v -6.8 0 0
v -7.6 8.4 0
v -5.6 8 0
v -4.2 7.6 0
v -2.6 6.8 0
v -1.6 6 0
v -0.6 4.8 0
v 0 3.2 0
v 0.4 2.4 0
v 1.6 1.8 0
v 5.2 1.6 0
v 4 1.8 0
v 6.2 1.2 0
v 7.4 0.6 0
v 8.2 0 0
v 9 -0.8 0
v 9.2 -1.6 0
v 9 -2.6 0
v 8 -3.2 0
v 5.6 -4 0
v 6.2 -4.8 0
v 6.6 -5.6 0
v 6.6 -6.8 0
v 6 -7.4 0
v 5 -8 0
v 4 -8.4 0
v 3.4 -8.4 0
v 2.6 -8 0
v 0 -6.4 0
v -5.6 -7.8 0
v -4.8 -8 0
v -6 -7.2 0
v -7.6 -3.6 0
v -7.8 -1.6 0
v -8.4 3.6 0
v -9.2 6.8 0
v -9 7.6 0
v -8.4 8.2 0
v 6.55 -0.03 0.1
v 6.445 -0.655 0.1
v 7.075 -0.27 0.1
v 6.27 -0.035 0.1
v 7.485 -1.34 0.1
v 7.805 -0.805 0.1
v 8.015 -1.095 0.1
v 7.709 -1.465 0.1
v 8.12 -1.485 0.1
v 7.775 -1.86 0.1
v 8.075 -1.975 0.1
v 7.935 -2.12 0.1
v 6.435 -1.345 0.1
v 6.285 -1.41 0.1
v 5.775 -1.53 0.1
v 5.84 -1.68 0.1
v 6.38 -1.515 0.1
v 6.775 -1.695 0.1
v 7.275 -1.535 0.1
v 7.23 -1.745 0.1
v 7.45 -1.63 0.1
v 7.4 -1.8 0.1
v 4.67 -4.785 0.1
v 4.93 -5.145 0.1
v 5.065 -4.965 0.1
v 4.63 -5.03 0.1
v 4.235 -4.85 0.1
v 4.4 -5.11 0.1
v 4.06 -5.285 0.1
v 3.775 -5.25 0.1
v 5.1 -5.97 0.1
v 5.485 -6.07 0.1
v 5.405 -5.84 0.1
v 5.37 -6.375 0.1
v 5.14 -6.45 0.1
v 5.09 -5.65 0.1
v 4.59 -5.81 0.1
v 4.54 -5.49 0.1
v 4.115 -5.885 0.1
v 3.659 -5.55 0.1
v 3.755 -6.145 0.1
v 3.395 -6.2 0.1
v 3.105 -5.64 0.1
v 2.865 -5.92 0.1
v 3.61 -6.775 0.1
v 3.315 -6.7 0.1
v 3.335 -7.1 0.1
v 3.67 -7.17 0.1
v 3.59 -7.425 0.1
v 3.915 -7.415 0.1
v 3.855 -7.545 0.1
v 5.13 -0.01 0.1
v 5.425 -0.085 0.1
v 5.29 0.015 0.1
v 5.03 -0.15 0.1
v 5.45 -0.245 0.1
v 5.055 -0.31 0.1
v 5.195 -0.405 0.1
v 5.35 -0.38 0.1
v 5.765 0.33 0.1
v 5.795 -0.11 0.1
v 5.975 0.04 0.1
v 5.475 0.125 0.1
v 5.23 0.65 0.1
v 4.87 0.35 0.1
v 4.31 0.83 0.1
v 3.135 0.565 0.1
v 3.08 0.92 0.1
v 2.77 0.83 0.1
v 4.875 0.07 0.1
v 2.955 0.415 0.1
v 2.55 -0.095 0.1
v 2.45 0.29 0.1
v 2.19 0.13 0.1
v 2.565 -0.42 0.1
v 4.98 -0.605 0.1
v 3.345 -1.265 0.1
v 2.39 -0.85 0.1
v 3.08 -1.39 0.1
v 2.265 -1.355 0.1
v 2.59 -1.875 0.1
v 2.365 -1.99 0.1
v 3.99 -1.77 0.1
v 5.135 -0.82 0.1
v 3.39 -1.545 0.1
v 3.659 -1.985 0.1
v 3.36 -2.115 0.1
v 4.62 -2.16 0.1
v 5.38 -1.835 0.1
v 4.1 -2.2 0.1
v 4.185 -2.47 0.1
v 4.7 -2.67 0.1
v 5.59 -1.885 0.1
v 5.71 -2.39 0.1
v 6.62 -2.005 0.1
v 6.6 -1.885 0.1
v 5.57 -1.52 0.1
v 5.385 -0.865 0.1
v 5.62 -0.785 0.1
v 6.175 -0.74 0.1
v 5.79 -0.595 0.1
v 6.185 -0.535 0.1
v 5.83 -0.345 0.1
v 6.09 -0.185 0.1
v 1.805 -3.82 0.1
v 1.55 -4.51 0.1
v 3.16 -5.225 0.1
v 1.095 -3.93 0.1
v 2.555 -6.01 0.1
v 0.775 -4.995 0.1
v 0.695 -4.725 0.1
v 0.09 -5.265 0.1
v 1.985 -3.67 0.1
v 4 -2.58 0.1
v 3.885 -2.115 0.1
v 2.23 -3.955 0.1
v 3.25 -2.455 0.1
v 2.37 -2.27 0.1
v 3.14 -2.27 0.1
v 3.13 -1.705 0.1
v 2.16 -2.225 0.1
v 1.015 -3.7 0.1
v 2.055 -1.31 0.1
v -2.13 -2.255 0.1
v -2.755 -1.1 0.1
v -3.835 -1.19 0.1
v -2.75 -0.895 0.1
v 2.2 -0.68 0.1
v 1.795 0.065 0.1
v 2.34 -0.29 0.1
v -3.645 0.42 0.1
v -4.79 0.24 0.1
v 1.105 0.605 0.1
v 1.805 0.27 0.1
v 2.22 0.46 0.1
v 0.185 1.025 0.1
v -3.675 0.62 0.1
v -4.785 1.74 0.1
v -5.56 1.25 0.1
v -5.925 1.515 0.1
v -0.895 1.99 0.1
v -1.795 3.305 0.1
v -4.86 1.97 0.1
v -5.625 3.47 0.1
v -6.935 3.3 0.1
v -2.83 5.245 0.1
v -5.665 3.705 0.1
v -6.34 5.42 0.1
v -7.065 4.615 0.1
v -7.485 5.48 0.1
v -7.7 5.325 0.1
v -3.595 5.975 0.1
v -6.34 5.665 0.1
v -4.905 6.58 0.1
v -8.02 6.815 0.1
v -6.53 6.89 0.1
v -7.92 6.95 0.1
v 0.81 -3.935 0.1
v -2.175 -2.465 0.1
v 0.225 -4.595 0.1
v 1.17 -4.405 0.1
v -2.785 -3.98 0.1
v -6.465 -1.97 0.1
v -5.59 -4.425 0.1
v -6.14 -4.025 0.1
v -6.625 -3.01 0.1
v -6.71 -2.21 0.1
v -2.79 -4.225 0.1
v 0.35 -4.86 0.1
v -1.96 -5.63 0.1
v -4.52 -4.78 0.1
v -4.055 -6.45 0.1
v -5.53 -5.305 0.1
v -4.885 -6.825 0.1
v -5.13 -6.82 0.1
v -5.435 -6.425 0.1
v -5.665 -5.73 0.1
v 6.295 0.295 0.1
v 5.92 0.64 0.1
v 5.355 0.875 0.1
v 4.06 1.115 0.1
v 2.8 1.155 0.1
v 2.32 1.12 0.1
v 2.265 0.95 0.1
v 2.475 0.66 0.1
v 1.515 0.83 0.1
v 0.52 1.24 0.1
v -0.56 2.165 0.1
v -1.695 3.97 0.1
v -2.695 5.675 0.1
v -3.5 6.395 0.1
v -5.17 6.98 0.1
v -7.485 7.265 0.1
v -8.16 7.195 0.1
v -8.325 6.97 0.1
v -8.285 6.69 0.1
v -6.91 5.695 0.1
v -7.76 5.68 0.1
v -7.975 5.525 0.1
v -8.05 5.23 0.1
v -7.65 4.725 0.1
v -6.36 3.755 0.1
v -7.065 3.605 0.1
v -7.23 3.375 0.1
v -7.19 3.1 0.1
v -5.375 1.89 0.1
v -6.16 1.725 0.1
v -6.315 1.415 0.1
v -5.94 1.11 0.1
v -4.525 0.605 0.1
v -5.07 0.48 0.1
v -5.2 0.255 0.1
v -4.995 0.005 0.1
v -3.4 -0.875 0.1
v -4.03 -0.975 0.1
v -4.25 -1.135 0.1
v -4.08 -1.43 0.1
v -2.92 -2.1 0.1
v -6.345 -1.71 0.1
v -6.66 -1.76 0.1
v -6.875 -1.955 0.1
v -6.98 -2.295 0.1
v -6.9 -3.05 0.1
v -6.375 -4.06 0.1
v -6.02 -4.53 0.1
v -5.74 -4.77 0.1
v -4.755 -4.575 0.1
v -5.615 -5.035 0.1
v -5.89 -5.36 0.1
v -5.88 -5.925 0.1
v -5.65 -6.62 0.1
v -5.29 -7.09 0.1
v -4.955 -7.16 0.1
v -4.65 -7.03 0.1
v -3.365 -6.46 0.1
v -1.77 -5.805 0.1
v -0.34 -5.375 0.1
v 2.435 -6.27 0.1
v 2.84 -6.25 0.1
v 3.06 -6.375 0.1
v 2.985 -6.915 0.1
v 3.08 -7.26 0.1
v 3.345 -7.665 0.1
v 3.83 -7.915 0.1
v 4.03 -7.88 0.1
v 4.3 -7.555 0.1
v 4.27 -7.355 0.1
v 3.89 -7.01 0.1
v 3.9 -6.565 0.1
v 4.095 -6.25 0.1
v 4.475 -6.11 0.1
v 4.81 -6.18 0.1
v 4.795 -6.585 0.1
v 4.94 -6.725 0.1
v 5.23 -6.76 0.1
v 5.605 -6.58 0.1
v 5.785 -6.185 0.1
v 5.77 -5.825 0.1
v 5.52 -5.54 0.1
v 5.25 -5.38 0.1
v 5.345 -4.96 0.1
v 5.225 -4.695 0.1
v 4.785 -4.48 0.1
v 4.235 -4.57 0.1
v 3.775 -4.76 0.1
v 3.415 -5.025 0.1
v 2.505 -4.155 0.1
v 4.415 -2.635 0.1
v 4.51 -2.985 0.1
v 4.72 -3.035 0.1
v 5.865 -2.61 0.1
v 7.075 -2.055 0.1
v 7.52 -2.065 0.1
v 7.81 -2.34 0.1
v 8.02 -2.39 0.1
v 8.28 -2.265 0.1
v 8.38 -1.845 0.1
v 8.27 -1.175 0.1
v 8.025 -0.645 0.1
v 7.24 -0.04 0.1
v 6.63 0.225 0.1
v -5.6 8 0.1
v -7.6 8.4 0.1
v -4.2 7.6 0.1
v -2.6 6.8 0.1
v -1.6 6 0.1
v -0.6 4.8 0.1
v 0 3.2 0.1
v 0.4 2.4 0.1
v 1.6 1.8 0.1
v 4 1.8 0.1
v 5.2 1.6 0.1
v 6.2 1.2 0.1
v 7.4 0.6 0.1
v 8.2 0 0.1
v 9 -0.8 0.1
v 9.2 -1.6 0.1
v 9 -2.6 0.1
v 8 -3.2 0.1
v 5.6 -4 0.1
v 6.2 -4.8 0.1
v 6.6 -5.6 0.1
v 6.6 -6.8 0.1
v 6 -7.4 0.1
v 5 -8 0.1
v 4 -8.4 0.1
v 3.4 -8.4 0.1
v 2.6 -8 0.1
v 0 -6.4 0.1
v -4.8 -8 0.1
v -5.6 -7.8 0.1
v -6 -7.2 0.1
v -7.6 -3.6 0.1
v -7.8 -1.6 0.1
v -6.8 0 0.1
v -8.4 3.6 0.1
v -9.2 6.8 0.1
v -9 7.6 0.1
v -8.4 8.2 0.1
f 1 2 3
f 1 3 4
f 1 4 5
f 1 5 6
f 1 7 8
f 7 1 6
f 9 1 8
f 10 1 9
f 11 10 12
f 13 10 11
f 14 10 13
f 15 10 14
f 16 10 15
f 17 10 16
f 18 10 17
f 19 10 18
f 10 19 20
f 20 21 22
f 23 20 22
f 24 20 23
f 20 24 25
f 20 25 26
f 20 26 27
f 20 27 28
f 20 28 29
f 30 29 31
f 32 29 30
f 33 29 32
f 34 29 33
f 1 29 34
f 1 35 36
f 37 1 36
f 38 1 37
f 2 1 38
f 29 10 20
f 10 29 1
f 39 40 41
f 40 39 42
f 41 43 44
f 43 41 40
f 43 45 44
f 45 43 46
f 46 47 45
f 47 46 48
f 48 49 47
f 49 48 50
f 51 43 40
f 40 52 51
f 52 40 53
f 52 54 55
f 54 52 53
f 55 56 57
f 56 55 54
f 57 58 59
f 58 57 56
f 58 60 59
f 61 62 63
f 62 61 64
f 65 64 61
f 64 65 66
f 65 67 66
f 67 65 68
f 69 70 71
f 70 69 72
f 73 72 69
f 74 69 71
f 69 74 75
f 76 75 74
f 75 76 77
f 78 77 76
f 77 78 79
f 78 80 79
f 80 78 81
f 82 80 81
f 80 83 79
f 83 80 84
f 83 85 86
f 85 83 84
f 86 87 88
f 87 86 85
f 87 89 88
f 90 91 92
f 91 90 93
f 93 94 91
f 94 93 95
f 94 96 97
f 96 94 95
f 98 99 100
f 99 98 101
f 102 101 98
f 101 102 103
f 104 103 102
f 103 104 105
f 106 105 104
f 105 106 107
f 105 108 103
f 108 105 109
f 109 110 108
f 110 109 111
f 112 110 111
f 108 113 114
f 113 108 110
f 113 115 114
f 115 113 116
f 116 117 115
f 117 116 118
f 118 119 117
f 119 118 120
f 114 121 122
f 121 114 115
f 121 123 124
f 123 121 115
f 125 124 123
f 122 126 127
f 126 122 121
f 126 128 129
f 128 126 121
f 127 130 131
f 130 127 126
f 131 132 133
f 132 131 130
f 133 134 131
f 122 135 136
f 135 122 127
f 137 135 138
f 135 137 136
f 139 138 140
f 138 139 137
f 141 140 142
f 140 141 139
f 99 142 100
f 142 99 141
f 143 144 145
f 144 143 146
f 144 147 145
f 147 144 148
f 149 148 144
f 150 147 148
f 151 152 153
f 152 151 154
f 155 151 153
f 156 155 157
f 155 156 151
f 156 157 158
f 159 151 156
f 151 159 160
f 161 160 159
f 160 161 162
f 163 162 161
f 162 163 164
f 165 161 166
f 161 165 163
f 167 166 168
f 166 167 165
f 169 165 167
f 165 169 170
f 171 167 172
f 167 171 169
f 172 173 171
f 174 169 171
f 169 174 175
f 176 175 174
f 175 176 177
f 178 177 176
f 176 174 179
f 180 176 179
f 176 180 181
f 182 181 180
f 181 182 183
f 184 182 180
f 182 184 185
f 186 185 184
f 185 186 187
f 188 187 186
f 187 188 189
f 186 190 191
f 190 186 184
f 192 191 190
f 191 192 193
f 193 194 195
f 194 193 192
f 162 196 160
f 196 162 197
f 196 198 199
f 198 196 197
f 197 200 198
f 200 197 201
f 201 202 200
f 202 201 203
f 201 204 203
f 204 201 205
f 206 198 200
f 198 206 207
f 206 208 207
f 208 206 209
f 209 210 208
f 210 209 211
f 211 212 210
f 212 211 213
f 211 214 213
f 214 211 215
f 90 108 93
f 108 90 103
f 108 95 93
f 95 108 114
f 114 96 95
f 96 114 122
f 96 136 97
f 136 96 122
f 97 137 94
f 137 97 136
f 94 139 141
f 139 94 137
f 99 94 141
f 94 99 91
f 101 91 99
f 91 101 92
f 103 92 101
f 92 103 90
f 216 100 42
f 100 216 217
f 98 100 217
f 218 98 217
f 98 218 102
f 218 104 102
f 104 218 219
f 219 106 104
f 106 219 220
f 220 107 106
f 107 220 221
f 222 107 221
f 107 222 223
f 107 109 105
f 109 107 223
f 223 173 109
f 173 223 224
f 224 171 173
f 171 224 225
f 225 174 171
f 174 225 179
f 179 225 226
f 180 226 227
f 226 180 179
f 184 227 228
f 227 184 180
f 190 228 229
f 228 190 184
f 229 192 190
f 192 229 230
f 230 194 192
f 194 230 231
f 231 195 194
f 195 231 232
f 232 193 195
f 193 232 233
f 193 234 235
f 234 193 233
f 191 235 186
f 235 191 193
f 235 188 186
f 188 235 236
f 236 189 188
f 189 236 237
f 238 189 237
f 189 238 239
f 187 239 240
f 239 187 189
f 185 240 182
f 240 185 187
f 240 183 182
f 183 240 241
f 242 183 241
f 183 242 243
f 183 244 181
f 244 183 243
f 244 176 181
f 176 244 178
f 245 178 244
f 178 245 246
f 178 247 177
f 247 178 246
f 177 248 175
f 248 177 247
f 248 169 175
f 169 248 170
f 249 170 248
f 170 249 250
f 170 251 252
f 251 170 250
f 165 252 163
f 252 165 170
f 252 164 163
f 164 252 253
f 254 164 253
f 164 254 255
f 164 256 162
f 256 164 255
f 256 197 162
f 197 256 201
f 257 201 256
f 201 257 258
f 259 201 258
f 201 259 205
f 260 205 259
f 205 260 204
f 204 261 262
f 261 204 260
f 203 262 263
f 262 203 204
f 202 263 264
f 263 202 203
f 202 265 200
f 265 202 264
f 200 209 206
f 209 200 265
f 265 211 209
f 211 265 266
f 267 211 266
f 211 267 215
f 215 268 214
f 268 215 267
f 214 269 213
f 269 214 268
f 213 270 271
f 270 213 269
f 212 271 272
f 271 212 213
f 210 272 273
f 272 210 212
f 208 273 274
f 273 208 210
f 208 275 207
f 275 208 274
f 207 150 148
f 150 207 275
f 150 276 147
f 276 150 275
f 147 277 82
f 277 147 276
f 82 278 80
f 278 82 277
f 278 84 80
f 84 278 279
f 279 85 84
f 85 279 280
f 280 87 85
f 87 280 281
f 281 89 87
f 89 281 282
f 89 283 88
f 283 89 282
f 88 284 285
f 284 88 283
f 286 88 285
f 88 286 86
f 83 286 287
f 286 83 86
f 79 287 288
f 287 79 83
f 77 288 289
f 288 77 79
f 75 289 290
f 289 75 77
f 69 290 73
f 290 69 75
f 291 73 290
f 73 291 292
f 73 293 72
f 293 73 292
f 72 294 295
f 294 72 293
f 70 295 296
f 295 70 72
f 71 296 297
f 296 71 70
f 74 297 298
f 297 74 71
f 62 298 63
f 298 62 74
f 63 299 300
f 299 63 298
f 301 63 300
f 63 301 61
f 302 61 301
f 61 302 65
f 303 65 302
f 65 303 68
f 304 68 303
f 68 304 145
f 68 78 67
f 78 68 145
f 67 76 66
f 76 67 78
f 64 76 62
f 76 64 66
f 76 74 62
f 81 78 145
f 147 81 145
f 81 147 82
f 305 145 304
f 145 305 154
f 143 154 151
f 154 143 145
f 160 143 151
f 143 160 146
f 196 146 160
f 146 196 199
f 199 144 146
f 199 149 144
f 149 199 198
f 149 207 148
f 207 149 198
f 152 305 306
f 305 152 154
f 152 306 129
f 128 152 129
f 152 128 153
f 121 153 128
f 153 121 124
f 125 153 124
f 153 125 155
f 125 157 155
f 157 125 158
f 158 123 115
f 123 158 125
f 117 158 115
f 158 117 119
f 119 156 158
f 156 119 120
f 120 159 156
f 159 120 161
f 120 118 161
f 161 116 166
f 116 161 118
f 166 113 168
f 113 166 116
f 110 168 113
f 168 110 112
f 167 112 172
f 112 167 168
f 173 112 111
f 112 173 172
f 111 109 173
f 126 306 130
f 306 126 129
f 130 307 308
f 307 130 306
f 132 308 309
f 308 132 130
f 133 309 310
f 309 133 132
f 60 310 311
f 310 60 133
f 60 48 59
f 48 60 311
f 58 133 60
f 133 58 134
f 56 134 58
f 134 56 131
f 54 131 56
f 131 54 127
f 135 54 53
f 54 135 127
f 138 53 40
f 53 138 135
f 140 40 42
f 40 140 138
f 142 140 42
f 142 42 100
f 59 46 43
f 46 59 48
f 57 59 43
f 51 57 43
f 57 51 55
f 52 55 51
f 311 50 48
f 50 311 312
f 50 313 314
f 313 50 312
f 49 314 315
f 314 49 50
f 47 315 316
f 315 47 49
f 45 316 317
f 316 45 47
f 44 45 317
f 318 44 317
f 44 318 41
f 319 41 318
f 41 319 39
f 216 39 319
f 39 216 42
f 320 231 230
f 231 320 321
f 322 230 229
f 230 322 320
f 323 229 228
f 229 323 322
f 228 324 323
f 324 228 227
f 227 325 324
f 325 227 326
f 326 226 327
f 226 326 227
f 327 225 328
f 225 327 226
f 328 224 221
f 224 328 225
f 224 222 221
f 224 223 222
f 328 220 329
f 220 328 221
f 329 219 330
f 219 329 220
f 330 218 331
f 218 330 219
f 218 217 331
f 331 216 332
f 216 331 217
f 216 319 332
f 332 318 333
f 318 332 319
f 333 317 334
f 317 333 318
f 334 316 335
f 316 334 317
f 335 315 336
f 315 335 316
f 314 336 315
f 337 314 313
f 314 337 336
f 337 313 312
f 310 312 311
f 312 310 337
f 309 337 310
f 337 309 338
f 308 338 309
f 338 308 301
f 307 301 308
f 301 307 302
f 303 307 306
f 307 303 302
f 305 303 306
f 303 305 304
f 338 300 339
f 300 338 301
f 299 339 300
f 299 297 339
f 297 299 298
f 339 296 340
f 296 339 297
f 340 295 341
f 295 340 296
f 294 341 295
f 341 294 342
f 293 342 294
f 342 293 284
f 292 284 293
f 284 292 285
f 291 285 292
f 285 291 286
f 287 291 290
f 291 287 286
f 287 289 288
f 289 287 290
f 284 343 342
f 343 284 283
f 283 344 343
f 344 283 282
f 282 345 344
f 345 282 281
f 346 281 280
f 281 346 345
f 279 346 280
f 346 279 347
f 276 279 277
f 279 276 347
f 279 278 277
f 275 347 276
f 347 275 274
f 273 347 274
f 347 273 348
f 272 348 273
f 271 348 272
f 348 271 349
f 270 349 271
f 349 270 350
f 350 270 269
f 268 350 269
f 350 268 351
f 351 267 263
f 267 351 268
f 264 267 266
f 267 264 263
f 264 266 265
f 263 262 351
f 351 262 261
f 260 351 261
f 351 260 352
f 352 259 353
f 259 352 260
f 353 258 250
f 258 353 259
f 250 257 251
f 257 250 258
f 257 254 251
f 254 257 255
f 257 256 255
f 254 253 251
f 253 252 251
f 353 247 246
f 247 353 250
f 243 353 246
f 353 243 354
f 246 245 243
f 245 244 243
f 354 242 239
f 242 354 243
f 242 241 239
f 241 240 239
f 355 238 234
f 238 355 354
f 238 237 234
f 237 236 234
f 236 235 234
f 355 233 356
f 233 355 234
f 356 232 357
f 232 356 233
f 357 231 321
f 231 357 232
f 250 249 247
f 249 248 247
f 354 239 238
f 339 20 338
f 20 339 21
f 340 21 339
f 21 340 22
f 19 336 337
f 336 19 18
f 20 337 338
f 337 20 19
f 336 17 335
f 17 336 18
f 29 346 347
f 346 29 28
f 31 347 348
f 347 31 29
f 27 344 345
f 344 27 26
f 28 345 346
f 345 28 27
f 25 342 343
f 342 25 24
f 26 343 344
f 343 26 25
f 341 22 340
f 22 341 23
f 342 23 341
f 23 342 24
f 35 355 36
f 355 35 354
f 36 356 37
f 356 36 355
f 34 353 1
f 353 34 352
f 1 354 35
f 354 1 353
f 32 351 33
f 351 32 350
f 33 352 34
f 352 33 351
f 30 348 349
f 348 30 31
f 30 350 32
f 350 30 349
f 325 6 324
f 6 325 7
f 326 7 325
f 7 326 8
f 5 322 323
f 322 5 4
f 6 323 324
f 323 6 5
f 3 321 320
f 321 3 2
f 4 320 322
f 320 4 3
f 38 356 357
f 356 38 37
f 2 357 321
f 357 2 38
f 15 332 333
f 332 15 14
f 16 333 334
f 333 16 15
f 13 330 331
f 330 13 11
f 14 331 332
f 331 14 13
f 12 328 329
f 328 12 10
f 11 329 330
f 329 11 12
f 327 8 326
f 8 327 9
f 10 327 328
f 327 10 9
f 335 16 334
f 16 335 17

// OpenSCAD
use <../lib.scad>
use <821409c.scad>
function ldraw_lib__821409d() = [
// 0 Sticker  2.1 x  2.3 with Blue Eagle Facing Right
// 0 Name: 821409d.dat
// 0 Author: Takeshi Takahashi [RainbowDolphin]
// 0 !LDRAW_ORG Part UPDATE 2024-10
// 0 !LICENSE Licensed under CC BY 4.0 : see CAreadme.txt
// 
// 0 BFC CERTIFY CCW
  [0,"BFC","CERTIFY"],
  [0,"BFC","CCW"],
// 
// 0 !KEYWORDS Aerial Acrobats, Set 6345
// 
// 0 !HISTORY 2024-12-01 [OrionP] Official Update 2024-10
// 
// 1 16 0 0 0 -1 0 0 0 1 0 0 0 1 821409c.dat
  [1,16,0,0,0,-1,0,0,0,1,0,0,0,1, ldraw_lib__821409c()],
];
module ldraw_lib__821409d(step=0, col=false, unit=2/5, alt=false, line=0.2, solid=!$preview)
    makepoly(ldraw_lib__821409d(), step=step, col=col, unit=unit, alt=alt, line=line, solid=solid);
ldraw_lib__821409d(line=0.2);
